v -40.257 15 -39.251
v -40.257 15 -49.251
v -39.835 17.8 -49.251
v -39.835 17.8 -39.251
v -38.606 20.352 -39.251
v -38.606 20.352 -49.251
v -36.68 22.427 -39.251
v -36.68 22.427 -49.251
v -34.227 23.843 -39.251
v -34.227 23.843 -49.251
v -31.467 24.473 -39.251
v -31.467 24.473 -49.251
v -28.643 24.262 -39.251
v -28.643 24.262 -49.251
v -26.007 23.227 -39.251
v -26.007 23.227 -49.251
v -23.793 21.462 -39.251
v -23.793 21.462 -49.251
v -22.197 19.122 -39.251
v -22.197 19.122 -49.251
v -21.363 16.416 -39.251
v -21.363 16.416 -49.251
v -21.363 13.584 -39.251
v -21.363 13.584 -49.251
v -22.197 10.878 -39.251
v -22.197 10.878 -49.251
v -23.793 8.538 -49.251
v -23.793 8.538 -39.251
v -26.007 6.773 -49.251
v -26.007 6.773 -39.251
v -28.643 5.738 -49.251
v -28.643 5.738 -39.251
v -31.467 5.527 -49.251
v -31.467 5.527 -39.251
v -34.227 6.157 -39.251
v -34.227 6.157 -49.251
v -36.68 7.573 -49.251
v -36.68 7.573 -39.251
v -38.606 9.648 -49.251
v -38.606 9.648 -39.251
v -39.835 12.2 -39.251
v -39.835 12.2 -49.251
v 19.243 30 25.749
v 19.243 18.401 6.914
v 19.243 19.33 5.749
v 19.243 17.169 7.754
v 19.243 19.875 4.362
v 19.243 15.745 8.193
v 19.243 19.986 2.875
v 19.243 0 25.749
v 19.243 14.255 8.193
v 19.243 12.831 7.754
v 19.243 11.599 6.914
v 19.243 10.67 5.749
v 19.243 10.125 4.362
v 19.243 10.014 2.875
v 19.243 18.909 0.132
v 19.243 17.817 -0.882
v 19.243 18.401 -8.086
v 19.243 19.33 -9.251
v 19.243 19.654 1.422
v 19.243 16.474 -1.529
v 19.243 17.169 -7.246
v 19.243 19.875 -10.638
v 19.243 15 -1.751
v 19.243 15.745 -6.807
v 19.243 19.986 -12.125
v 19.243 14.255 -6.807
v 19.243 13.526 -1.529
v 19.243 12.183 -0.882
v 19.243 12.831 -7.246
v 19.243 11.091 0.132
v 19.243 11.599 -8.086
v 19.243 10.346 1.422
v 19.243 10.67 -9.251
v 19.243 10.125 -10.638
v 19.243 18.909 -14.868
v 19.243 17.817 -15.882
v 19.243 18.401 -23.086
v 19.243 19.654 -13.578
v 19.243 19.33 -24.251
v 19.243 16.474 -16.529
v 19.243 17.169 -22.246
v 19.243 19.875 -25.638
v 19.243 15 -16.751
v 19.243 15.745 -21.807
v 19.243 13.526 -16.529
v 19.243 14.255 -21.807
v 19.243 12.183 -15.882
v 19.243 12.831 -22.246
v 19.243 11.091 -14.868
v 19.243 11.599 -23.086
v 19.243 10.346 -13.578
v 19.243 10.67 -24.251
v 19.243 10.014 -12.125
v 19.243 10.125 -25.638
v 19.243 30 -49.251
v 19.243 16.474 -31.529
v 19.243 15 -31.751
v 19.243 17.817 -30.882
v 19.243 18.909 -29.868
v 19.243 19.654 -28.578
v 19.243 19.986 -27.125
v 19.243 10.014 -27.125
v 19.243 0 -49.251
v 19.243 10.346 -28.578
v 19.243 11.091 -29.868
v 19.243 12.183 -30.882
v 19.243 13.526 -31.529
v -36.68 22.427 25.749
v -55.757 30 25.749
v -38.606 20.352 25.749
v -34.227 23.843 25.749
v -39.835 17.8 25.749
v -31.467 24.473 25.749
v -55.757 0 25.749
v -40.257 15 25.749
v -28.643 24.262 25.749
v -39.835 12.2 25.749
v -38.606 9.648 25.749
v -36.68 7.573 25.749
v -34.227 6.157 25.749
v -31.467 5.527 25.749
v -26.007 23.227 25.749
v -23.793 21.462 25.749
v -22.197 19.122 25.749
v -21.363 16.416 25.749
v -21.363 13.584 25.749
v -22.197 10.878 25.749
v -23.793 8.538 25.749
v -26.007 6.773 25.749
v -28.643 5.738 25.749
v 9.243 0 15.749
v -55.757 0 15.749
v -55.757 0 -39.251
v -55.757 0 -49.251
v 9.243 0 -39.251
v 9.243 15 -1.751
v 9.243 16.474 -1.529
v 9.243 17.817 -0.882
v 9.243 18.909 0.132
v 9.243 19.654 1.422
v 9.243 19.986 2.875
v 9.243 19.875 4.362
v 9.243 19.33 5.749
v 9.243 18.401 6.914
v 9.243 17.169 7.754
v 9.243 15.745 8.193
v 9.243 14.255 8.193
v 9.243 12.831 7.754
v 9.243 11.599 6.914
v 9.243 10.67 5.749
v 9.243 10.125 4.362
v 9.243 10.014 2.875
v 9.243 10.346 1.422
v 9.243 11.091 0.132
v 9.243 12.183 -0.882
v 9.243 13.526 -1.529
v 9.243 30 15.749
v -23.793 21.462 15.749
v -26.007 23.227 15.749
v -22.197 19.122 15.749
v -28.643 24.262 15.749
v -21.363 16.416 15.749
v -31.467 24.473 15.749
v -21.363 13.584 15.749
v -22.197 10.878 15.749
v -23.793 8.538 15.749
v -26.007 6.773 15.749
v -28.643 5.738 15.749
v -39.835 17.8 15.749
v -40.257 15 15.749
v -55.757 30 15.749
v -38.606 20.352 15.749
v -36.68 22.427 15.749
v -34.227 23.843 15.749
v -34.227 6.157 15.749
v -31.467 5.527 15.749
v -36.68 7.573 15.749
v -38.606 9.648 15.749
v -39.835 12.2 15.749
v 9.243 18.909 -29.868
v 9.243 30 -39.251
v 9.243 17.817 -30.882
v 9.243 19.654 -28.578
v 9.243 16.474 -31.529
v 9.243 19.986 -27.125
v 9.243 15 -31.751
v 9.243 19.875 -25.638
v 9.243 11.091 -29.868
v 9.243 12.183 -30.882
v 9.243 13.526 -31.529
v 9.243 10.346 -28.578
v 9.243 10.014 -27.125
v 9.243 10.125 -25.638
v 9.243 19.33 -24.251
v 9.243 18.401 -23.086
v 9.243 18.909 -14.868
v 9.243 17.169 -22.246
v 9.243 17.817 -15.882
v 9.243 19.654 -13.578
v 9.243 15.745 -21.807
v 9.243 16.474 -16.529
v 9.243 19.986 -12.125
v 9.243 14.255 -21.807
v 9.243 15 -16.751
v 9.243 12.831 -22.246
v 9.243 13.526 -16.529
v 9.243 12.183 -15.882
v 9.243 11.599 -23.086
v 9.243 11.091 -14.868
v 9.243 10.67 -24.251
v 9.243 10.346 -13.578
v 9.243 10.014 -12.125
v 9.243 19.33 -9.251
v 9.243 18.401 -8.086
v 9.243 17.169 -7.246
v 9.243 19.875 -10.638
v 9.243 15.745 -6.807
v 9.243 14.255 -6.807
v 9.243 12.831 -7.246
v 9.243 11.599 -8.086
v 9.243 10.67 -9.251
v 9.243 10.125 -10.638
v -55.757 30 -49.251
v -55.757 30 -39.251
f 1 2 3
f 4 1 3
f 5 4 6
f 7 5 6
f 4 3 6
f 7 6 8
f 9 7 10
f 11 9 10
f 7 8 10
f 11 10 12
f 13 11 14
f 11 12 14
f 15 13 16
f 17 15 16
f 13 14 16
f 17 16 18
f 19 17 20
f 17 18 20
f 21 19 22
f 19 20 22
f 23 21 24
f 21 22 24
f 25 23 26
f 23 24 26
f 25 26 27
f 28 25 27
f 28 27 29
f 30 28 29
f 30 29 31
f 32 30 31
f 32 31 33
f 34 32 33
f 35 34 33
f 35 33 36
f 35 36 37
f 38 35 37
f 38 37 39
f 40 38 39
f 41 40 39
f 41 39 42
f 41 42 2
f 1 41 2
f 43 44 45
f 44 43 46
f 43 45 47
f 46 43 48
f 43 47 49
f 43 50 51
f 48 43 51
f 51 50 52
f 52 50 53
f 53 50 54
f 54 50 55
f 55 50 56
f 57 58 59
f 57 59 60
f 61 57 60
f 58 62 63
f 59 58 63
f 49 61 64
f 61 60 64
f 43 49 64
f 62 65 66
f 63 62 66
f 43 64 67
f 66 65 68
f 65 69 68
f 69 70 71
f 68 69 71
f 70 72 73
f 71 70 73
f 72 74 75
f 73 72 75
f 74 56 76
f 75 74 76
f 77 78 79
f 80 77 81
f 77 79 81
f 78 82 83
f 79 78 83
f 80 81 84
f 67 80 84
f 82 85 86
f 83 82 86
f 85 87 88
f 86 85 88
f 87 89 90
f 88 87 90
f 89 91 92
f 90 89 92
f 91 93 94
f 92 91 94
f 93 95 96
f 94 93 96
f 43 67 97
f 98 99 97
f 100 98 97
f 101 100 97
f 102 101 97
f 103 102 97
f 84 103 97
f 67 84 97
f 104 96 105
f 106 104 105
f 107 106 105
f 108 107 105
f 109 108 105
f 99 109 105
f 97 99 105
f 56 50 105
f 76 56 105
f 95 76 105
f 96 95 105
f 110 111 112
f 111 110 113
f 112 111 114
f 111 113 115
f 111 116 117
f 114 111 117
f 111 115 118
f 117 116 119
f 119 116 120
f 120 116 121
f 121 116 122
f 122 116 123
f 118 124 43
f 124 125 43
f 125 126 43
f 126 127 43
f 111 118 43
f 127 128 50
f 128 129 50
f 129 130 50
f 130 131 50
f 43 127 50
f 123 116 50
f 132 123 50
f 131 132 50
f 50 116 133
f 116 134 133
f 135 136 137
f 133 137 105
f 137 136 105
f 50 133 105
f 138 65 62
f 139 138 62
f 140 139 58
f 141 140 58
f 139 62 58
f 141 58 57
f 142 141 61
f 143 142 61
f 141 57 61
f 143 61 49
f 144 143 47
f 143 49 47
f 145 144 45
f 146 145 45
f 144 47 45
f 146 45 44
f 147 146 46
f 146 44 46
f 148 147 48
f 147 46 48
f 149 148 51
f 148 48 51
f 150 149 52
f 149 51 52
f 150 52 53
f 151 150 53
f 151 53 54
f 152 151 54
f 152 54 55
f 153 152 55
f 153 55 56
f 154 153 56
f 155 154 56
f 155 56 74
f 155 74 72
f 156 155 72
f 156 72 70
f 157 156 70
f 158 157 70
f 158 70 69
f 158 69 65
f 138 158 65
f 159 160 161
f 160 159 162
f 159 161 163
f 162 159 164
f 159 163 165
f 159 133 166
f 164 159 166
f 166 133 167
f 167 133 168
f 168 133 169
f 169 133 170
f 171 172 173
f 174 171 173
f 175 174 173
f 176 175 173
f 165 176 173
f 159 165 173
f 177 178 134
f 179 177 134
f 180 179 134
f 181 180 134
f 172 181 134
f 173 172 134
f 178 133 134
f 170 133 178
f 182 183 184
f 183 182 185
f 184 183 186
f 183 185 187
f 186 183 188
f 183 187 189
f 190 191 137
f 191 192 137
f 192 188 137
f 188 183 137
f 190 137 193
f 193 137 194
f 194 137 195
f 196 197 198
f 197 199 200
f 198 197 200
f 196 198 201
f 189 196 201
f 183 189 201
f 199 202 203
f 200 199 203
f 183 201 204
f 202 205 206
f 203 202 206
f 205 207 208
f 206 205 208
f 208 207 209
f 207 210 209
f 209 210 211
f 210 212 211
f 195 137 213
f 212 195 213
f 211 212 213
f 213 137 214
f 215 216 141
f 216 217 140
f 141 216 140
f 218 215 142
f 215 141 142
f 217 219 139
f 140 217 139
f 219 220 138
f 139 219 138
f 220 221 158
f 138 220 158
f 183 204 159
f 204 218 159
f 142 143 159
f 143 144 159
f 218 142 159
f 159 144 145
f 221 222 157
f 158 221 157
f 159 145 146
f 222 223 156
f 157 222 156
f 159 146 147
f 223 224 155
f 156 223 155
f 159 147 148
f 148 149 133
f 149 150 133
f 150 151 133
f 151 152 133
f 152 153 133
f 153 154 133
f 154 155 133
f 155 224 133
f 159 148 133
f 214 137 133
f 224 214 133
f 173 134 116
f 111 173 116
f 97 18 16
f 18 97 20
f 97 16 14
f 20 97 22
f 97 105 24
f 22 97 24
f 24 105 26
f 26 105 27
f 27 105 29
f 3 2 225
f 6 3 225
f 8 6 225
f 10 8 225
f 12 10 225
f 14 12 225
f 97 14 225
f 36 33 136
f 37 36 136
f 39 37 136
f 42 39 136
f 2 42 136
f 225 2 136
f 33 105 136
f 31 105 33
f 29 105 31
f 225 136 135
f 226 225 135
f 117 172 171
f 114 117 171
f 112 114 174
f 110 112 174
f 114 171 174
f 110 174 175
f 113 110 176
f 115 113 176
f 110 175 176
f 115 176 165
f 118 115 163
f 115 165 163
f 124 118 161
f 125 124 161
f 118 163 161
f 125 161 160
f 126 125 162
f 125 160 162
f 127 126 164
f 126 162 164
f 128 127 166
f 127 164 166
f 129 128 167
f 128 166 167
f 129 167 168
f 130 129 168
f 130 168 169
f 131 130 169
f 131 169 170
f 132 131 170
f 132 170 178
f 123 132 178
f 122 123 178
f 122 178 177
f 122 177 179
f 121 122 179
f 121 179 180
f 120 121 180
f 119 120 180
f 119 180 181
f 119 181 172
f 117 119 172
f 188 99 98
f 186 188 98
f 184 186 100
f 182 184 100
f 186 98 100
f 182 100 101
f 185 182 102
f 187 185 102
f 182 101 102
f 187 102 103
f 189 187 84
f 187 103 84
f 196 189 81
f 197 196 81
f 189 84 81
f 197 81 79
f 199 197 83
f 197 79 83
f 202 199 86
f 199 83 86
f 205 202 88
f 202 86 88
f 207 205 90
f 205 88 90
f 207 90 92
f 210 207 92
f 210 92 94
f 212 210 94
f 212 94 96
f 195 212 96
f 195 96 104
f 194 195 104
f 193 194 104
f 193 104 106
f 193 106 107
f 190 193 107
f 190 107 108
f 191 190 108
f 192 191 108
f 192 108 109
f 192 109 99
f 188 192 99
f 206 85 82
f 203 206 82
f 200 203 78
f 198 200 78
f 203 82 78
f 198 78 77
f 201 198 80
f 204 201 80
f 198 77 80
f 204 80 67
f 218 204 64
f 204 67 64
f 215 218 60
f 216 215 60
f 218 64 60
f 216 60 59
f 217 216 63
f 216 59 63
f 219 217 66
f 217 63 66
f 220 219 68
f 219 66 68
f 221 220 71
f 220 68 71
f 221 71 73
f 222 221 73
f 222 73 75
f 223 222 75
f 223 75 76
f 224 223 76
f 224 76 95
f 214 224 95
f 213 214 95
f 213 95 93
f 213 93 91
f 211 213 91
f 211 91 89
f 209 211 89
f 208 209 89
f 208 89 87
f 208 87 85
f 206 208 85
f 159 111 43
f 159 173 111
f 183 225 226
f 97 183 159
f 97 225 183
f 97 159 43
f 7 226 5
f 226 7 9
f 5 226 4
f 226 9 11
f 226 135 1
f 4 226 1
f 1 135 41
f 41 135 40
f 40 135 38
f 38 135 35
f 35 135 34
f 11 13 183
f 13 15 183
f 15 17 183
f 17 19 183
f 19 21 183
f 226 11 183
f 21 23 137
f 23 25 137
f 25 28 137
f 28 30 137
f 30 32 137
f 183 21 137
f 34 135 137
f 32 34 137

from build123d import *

# Parameters (mm, degrees)
BOSS_EXTRUDE1_DEPTH              = 30
SKETCH3_R                        = 9.5
CUT_EXTRUDE1_DEPTH               = 90
M10X1_0_TAPPED_HOLE1_D           = 9
M10X1_0_TAPPED_HOLE1_DEPTH       = 23
M10X1_0_TAPPED_HOLE1_CBORE_D     = 10
M10X1_0_TAPPED_HOLE1_CBORE_DEPTH = 20
M10X1_0_TAPPED_HOLE1_TIP         = 2.703872786


with BuildPart() as part:
    # Sketch1 → Boss-Extrude1 (new body)
    with BuildSketch(Plane(origin=(0, 0, 0), x_dir=(1, 0, 0), z_dir=(0, 1, 0))):
        Polygon((-55.756575978, -25.748980809), (19.243424022, -25.748980809), (19.243424022, 49.251019191), (-55.756575978, 49.251019191), (-55.756575978, 39.251019191), (9.243424022, 39.251019191), (9.243424022, -15.748980809), (-55.756575978, -15.748980809), align=None)
    extrude(amount=BOSS_EXTRUDE1_DEPTH)

    # Sketch3 → Cut-Extrude1 (cut)
    with BuildSketch(Plane(origin=(0, 0, -49.251019191), x_dir=(-1, 0, 0), z_dir=(0, 0, -1))):
        with Locations((30.756575978, 15)):
            Circle(SKETCH3_R)
    extrude(amount=-CUT_EXTRUDE1_DEPTH, mode=Mode.SUBTRACT)

    # M10x1.0 Tapped Hole1
    with Locations(Plane(origin=(19.243424022, 0, 0), x_dir=(0, 0, -1), z_dir=(1, 0, 0))):
        with Locations((-3.248980809, 15), (11.751019191, 15), (26.751019191, 15)):
            CounterBoreHole(M10X1_0_TAPPED_HOLE1_D / 2, M10X1_0_TAPPED_HOLE1_CBORE_D / 2, M10X1_0_TAPPED_HOLE1_CBORE_DEPTH, depth=M10X1_0_TAPPED_HOLE1_DEPTH)
            with Locations((0, 0, -(M10X1_0_TAPPED_HOLE1_DEPTH + M10X1_0_TAPPED_HOLE1_TIP / 2))):  # 118° drill point
                Cone(0, M10X1_0_TAPPED_HOLE1_D / 2, M10X1_0_TAPPED_HOLE1_TIP, mode=Mode.SUBTRACT)


solid = part.part
